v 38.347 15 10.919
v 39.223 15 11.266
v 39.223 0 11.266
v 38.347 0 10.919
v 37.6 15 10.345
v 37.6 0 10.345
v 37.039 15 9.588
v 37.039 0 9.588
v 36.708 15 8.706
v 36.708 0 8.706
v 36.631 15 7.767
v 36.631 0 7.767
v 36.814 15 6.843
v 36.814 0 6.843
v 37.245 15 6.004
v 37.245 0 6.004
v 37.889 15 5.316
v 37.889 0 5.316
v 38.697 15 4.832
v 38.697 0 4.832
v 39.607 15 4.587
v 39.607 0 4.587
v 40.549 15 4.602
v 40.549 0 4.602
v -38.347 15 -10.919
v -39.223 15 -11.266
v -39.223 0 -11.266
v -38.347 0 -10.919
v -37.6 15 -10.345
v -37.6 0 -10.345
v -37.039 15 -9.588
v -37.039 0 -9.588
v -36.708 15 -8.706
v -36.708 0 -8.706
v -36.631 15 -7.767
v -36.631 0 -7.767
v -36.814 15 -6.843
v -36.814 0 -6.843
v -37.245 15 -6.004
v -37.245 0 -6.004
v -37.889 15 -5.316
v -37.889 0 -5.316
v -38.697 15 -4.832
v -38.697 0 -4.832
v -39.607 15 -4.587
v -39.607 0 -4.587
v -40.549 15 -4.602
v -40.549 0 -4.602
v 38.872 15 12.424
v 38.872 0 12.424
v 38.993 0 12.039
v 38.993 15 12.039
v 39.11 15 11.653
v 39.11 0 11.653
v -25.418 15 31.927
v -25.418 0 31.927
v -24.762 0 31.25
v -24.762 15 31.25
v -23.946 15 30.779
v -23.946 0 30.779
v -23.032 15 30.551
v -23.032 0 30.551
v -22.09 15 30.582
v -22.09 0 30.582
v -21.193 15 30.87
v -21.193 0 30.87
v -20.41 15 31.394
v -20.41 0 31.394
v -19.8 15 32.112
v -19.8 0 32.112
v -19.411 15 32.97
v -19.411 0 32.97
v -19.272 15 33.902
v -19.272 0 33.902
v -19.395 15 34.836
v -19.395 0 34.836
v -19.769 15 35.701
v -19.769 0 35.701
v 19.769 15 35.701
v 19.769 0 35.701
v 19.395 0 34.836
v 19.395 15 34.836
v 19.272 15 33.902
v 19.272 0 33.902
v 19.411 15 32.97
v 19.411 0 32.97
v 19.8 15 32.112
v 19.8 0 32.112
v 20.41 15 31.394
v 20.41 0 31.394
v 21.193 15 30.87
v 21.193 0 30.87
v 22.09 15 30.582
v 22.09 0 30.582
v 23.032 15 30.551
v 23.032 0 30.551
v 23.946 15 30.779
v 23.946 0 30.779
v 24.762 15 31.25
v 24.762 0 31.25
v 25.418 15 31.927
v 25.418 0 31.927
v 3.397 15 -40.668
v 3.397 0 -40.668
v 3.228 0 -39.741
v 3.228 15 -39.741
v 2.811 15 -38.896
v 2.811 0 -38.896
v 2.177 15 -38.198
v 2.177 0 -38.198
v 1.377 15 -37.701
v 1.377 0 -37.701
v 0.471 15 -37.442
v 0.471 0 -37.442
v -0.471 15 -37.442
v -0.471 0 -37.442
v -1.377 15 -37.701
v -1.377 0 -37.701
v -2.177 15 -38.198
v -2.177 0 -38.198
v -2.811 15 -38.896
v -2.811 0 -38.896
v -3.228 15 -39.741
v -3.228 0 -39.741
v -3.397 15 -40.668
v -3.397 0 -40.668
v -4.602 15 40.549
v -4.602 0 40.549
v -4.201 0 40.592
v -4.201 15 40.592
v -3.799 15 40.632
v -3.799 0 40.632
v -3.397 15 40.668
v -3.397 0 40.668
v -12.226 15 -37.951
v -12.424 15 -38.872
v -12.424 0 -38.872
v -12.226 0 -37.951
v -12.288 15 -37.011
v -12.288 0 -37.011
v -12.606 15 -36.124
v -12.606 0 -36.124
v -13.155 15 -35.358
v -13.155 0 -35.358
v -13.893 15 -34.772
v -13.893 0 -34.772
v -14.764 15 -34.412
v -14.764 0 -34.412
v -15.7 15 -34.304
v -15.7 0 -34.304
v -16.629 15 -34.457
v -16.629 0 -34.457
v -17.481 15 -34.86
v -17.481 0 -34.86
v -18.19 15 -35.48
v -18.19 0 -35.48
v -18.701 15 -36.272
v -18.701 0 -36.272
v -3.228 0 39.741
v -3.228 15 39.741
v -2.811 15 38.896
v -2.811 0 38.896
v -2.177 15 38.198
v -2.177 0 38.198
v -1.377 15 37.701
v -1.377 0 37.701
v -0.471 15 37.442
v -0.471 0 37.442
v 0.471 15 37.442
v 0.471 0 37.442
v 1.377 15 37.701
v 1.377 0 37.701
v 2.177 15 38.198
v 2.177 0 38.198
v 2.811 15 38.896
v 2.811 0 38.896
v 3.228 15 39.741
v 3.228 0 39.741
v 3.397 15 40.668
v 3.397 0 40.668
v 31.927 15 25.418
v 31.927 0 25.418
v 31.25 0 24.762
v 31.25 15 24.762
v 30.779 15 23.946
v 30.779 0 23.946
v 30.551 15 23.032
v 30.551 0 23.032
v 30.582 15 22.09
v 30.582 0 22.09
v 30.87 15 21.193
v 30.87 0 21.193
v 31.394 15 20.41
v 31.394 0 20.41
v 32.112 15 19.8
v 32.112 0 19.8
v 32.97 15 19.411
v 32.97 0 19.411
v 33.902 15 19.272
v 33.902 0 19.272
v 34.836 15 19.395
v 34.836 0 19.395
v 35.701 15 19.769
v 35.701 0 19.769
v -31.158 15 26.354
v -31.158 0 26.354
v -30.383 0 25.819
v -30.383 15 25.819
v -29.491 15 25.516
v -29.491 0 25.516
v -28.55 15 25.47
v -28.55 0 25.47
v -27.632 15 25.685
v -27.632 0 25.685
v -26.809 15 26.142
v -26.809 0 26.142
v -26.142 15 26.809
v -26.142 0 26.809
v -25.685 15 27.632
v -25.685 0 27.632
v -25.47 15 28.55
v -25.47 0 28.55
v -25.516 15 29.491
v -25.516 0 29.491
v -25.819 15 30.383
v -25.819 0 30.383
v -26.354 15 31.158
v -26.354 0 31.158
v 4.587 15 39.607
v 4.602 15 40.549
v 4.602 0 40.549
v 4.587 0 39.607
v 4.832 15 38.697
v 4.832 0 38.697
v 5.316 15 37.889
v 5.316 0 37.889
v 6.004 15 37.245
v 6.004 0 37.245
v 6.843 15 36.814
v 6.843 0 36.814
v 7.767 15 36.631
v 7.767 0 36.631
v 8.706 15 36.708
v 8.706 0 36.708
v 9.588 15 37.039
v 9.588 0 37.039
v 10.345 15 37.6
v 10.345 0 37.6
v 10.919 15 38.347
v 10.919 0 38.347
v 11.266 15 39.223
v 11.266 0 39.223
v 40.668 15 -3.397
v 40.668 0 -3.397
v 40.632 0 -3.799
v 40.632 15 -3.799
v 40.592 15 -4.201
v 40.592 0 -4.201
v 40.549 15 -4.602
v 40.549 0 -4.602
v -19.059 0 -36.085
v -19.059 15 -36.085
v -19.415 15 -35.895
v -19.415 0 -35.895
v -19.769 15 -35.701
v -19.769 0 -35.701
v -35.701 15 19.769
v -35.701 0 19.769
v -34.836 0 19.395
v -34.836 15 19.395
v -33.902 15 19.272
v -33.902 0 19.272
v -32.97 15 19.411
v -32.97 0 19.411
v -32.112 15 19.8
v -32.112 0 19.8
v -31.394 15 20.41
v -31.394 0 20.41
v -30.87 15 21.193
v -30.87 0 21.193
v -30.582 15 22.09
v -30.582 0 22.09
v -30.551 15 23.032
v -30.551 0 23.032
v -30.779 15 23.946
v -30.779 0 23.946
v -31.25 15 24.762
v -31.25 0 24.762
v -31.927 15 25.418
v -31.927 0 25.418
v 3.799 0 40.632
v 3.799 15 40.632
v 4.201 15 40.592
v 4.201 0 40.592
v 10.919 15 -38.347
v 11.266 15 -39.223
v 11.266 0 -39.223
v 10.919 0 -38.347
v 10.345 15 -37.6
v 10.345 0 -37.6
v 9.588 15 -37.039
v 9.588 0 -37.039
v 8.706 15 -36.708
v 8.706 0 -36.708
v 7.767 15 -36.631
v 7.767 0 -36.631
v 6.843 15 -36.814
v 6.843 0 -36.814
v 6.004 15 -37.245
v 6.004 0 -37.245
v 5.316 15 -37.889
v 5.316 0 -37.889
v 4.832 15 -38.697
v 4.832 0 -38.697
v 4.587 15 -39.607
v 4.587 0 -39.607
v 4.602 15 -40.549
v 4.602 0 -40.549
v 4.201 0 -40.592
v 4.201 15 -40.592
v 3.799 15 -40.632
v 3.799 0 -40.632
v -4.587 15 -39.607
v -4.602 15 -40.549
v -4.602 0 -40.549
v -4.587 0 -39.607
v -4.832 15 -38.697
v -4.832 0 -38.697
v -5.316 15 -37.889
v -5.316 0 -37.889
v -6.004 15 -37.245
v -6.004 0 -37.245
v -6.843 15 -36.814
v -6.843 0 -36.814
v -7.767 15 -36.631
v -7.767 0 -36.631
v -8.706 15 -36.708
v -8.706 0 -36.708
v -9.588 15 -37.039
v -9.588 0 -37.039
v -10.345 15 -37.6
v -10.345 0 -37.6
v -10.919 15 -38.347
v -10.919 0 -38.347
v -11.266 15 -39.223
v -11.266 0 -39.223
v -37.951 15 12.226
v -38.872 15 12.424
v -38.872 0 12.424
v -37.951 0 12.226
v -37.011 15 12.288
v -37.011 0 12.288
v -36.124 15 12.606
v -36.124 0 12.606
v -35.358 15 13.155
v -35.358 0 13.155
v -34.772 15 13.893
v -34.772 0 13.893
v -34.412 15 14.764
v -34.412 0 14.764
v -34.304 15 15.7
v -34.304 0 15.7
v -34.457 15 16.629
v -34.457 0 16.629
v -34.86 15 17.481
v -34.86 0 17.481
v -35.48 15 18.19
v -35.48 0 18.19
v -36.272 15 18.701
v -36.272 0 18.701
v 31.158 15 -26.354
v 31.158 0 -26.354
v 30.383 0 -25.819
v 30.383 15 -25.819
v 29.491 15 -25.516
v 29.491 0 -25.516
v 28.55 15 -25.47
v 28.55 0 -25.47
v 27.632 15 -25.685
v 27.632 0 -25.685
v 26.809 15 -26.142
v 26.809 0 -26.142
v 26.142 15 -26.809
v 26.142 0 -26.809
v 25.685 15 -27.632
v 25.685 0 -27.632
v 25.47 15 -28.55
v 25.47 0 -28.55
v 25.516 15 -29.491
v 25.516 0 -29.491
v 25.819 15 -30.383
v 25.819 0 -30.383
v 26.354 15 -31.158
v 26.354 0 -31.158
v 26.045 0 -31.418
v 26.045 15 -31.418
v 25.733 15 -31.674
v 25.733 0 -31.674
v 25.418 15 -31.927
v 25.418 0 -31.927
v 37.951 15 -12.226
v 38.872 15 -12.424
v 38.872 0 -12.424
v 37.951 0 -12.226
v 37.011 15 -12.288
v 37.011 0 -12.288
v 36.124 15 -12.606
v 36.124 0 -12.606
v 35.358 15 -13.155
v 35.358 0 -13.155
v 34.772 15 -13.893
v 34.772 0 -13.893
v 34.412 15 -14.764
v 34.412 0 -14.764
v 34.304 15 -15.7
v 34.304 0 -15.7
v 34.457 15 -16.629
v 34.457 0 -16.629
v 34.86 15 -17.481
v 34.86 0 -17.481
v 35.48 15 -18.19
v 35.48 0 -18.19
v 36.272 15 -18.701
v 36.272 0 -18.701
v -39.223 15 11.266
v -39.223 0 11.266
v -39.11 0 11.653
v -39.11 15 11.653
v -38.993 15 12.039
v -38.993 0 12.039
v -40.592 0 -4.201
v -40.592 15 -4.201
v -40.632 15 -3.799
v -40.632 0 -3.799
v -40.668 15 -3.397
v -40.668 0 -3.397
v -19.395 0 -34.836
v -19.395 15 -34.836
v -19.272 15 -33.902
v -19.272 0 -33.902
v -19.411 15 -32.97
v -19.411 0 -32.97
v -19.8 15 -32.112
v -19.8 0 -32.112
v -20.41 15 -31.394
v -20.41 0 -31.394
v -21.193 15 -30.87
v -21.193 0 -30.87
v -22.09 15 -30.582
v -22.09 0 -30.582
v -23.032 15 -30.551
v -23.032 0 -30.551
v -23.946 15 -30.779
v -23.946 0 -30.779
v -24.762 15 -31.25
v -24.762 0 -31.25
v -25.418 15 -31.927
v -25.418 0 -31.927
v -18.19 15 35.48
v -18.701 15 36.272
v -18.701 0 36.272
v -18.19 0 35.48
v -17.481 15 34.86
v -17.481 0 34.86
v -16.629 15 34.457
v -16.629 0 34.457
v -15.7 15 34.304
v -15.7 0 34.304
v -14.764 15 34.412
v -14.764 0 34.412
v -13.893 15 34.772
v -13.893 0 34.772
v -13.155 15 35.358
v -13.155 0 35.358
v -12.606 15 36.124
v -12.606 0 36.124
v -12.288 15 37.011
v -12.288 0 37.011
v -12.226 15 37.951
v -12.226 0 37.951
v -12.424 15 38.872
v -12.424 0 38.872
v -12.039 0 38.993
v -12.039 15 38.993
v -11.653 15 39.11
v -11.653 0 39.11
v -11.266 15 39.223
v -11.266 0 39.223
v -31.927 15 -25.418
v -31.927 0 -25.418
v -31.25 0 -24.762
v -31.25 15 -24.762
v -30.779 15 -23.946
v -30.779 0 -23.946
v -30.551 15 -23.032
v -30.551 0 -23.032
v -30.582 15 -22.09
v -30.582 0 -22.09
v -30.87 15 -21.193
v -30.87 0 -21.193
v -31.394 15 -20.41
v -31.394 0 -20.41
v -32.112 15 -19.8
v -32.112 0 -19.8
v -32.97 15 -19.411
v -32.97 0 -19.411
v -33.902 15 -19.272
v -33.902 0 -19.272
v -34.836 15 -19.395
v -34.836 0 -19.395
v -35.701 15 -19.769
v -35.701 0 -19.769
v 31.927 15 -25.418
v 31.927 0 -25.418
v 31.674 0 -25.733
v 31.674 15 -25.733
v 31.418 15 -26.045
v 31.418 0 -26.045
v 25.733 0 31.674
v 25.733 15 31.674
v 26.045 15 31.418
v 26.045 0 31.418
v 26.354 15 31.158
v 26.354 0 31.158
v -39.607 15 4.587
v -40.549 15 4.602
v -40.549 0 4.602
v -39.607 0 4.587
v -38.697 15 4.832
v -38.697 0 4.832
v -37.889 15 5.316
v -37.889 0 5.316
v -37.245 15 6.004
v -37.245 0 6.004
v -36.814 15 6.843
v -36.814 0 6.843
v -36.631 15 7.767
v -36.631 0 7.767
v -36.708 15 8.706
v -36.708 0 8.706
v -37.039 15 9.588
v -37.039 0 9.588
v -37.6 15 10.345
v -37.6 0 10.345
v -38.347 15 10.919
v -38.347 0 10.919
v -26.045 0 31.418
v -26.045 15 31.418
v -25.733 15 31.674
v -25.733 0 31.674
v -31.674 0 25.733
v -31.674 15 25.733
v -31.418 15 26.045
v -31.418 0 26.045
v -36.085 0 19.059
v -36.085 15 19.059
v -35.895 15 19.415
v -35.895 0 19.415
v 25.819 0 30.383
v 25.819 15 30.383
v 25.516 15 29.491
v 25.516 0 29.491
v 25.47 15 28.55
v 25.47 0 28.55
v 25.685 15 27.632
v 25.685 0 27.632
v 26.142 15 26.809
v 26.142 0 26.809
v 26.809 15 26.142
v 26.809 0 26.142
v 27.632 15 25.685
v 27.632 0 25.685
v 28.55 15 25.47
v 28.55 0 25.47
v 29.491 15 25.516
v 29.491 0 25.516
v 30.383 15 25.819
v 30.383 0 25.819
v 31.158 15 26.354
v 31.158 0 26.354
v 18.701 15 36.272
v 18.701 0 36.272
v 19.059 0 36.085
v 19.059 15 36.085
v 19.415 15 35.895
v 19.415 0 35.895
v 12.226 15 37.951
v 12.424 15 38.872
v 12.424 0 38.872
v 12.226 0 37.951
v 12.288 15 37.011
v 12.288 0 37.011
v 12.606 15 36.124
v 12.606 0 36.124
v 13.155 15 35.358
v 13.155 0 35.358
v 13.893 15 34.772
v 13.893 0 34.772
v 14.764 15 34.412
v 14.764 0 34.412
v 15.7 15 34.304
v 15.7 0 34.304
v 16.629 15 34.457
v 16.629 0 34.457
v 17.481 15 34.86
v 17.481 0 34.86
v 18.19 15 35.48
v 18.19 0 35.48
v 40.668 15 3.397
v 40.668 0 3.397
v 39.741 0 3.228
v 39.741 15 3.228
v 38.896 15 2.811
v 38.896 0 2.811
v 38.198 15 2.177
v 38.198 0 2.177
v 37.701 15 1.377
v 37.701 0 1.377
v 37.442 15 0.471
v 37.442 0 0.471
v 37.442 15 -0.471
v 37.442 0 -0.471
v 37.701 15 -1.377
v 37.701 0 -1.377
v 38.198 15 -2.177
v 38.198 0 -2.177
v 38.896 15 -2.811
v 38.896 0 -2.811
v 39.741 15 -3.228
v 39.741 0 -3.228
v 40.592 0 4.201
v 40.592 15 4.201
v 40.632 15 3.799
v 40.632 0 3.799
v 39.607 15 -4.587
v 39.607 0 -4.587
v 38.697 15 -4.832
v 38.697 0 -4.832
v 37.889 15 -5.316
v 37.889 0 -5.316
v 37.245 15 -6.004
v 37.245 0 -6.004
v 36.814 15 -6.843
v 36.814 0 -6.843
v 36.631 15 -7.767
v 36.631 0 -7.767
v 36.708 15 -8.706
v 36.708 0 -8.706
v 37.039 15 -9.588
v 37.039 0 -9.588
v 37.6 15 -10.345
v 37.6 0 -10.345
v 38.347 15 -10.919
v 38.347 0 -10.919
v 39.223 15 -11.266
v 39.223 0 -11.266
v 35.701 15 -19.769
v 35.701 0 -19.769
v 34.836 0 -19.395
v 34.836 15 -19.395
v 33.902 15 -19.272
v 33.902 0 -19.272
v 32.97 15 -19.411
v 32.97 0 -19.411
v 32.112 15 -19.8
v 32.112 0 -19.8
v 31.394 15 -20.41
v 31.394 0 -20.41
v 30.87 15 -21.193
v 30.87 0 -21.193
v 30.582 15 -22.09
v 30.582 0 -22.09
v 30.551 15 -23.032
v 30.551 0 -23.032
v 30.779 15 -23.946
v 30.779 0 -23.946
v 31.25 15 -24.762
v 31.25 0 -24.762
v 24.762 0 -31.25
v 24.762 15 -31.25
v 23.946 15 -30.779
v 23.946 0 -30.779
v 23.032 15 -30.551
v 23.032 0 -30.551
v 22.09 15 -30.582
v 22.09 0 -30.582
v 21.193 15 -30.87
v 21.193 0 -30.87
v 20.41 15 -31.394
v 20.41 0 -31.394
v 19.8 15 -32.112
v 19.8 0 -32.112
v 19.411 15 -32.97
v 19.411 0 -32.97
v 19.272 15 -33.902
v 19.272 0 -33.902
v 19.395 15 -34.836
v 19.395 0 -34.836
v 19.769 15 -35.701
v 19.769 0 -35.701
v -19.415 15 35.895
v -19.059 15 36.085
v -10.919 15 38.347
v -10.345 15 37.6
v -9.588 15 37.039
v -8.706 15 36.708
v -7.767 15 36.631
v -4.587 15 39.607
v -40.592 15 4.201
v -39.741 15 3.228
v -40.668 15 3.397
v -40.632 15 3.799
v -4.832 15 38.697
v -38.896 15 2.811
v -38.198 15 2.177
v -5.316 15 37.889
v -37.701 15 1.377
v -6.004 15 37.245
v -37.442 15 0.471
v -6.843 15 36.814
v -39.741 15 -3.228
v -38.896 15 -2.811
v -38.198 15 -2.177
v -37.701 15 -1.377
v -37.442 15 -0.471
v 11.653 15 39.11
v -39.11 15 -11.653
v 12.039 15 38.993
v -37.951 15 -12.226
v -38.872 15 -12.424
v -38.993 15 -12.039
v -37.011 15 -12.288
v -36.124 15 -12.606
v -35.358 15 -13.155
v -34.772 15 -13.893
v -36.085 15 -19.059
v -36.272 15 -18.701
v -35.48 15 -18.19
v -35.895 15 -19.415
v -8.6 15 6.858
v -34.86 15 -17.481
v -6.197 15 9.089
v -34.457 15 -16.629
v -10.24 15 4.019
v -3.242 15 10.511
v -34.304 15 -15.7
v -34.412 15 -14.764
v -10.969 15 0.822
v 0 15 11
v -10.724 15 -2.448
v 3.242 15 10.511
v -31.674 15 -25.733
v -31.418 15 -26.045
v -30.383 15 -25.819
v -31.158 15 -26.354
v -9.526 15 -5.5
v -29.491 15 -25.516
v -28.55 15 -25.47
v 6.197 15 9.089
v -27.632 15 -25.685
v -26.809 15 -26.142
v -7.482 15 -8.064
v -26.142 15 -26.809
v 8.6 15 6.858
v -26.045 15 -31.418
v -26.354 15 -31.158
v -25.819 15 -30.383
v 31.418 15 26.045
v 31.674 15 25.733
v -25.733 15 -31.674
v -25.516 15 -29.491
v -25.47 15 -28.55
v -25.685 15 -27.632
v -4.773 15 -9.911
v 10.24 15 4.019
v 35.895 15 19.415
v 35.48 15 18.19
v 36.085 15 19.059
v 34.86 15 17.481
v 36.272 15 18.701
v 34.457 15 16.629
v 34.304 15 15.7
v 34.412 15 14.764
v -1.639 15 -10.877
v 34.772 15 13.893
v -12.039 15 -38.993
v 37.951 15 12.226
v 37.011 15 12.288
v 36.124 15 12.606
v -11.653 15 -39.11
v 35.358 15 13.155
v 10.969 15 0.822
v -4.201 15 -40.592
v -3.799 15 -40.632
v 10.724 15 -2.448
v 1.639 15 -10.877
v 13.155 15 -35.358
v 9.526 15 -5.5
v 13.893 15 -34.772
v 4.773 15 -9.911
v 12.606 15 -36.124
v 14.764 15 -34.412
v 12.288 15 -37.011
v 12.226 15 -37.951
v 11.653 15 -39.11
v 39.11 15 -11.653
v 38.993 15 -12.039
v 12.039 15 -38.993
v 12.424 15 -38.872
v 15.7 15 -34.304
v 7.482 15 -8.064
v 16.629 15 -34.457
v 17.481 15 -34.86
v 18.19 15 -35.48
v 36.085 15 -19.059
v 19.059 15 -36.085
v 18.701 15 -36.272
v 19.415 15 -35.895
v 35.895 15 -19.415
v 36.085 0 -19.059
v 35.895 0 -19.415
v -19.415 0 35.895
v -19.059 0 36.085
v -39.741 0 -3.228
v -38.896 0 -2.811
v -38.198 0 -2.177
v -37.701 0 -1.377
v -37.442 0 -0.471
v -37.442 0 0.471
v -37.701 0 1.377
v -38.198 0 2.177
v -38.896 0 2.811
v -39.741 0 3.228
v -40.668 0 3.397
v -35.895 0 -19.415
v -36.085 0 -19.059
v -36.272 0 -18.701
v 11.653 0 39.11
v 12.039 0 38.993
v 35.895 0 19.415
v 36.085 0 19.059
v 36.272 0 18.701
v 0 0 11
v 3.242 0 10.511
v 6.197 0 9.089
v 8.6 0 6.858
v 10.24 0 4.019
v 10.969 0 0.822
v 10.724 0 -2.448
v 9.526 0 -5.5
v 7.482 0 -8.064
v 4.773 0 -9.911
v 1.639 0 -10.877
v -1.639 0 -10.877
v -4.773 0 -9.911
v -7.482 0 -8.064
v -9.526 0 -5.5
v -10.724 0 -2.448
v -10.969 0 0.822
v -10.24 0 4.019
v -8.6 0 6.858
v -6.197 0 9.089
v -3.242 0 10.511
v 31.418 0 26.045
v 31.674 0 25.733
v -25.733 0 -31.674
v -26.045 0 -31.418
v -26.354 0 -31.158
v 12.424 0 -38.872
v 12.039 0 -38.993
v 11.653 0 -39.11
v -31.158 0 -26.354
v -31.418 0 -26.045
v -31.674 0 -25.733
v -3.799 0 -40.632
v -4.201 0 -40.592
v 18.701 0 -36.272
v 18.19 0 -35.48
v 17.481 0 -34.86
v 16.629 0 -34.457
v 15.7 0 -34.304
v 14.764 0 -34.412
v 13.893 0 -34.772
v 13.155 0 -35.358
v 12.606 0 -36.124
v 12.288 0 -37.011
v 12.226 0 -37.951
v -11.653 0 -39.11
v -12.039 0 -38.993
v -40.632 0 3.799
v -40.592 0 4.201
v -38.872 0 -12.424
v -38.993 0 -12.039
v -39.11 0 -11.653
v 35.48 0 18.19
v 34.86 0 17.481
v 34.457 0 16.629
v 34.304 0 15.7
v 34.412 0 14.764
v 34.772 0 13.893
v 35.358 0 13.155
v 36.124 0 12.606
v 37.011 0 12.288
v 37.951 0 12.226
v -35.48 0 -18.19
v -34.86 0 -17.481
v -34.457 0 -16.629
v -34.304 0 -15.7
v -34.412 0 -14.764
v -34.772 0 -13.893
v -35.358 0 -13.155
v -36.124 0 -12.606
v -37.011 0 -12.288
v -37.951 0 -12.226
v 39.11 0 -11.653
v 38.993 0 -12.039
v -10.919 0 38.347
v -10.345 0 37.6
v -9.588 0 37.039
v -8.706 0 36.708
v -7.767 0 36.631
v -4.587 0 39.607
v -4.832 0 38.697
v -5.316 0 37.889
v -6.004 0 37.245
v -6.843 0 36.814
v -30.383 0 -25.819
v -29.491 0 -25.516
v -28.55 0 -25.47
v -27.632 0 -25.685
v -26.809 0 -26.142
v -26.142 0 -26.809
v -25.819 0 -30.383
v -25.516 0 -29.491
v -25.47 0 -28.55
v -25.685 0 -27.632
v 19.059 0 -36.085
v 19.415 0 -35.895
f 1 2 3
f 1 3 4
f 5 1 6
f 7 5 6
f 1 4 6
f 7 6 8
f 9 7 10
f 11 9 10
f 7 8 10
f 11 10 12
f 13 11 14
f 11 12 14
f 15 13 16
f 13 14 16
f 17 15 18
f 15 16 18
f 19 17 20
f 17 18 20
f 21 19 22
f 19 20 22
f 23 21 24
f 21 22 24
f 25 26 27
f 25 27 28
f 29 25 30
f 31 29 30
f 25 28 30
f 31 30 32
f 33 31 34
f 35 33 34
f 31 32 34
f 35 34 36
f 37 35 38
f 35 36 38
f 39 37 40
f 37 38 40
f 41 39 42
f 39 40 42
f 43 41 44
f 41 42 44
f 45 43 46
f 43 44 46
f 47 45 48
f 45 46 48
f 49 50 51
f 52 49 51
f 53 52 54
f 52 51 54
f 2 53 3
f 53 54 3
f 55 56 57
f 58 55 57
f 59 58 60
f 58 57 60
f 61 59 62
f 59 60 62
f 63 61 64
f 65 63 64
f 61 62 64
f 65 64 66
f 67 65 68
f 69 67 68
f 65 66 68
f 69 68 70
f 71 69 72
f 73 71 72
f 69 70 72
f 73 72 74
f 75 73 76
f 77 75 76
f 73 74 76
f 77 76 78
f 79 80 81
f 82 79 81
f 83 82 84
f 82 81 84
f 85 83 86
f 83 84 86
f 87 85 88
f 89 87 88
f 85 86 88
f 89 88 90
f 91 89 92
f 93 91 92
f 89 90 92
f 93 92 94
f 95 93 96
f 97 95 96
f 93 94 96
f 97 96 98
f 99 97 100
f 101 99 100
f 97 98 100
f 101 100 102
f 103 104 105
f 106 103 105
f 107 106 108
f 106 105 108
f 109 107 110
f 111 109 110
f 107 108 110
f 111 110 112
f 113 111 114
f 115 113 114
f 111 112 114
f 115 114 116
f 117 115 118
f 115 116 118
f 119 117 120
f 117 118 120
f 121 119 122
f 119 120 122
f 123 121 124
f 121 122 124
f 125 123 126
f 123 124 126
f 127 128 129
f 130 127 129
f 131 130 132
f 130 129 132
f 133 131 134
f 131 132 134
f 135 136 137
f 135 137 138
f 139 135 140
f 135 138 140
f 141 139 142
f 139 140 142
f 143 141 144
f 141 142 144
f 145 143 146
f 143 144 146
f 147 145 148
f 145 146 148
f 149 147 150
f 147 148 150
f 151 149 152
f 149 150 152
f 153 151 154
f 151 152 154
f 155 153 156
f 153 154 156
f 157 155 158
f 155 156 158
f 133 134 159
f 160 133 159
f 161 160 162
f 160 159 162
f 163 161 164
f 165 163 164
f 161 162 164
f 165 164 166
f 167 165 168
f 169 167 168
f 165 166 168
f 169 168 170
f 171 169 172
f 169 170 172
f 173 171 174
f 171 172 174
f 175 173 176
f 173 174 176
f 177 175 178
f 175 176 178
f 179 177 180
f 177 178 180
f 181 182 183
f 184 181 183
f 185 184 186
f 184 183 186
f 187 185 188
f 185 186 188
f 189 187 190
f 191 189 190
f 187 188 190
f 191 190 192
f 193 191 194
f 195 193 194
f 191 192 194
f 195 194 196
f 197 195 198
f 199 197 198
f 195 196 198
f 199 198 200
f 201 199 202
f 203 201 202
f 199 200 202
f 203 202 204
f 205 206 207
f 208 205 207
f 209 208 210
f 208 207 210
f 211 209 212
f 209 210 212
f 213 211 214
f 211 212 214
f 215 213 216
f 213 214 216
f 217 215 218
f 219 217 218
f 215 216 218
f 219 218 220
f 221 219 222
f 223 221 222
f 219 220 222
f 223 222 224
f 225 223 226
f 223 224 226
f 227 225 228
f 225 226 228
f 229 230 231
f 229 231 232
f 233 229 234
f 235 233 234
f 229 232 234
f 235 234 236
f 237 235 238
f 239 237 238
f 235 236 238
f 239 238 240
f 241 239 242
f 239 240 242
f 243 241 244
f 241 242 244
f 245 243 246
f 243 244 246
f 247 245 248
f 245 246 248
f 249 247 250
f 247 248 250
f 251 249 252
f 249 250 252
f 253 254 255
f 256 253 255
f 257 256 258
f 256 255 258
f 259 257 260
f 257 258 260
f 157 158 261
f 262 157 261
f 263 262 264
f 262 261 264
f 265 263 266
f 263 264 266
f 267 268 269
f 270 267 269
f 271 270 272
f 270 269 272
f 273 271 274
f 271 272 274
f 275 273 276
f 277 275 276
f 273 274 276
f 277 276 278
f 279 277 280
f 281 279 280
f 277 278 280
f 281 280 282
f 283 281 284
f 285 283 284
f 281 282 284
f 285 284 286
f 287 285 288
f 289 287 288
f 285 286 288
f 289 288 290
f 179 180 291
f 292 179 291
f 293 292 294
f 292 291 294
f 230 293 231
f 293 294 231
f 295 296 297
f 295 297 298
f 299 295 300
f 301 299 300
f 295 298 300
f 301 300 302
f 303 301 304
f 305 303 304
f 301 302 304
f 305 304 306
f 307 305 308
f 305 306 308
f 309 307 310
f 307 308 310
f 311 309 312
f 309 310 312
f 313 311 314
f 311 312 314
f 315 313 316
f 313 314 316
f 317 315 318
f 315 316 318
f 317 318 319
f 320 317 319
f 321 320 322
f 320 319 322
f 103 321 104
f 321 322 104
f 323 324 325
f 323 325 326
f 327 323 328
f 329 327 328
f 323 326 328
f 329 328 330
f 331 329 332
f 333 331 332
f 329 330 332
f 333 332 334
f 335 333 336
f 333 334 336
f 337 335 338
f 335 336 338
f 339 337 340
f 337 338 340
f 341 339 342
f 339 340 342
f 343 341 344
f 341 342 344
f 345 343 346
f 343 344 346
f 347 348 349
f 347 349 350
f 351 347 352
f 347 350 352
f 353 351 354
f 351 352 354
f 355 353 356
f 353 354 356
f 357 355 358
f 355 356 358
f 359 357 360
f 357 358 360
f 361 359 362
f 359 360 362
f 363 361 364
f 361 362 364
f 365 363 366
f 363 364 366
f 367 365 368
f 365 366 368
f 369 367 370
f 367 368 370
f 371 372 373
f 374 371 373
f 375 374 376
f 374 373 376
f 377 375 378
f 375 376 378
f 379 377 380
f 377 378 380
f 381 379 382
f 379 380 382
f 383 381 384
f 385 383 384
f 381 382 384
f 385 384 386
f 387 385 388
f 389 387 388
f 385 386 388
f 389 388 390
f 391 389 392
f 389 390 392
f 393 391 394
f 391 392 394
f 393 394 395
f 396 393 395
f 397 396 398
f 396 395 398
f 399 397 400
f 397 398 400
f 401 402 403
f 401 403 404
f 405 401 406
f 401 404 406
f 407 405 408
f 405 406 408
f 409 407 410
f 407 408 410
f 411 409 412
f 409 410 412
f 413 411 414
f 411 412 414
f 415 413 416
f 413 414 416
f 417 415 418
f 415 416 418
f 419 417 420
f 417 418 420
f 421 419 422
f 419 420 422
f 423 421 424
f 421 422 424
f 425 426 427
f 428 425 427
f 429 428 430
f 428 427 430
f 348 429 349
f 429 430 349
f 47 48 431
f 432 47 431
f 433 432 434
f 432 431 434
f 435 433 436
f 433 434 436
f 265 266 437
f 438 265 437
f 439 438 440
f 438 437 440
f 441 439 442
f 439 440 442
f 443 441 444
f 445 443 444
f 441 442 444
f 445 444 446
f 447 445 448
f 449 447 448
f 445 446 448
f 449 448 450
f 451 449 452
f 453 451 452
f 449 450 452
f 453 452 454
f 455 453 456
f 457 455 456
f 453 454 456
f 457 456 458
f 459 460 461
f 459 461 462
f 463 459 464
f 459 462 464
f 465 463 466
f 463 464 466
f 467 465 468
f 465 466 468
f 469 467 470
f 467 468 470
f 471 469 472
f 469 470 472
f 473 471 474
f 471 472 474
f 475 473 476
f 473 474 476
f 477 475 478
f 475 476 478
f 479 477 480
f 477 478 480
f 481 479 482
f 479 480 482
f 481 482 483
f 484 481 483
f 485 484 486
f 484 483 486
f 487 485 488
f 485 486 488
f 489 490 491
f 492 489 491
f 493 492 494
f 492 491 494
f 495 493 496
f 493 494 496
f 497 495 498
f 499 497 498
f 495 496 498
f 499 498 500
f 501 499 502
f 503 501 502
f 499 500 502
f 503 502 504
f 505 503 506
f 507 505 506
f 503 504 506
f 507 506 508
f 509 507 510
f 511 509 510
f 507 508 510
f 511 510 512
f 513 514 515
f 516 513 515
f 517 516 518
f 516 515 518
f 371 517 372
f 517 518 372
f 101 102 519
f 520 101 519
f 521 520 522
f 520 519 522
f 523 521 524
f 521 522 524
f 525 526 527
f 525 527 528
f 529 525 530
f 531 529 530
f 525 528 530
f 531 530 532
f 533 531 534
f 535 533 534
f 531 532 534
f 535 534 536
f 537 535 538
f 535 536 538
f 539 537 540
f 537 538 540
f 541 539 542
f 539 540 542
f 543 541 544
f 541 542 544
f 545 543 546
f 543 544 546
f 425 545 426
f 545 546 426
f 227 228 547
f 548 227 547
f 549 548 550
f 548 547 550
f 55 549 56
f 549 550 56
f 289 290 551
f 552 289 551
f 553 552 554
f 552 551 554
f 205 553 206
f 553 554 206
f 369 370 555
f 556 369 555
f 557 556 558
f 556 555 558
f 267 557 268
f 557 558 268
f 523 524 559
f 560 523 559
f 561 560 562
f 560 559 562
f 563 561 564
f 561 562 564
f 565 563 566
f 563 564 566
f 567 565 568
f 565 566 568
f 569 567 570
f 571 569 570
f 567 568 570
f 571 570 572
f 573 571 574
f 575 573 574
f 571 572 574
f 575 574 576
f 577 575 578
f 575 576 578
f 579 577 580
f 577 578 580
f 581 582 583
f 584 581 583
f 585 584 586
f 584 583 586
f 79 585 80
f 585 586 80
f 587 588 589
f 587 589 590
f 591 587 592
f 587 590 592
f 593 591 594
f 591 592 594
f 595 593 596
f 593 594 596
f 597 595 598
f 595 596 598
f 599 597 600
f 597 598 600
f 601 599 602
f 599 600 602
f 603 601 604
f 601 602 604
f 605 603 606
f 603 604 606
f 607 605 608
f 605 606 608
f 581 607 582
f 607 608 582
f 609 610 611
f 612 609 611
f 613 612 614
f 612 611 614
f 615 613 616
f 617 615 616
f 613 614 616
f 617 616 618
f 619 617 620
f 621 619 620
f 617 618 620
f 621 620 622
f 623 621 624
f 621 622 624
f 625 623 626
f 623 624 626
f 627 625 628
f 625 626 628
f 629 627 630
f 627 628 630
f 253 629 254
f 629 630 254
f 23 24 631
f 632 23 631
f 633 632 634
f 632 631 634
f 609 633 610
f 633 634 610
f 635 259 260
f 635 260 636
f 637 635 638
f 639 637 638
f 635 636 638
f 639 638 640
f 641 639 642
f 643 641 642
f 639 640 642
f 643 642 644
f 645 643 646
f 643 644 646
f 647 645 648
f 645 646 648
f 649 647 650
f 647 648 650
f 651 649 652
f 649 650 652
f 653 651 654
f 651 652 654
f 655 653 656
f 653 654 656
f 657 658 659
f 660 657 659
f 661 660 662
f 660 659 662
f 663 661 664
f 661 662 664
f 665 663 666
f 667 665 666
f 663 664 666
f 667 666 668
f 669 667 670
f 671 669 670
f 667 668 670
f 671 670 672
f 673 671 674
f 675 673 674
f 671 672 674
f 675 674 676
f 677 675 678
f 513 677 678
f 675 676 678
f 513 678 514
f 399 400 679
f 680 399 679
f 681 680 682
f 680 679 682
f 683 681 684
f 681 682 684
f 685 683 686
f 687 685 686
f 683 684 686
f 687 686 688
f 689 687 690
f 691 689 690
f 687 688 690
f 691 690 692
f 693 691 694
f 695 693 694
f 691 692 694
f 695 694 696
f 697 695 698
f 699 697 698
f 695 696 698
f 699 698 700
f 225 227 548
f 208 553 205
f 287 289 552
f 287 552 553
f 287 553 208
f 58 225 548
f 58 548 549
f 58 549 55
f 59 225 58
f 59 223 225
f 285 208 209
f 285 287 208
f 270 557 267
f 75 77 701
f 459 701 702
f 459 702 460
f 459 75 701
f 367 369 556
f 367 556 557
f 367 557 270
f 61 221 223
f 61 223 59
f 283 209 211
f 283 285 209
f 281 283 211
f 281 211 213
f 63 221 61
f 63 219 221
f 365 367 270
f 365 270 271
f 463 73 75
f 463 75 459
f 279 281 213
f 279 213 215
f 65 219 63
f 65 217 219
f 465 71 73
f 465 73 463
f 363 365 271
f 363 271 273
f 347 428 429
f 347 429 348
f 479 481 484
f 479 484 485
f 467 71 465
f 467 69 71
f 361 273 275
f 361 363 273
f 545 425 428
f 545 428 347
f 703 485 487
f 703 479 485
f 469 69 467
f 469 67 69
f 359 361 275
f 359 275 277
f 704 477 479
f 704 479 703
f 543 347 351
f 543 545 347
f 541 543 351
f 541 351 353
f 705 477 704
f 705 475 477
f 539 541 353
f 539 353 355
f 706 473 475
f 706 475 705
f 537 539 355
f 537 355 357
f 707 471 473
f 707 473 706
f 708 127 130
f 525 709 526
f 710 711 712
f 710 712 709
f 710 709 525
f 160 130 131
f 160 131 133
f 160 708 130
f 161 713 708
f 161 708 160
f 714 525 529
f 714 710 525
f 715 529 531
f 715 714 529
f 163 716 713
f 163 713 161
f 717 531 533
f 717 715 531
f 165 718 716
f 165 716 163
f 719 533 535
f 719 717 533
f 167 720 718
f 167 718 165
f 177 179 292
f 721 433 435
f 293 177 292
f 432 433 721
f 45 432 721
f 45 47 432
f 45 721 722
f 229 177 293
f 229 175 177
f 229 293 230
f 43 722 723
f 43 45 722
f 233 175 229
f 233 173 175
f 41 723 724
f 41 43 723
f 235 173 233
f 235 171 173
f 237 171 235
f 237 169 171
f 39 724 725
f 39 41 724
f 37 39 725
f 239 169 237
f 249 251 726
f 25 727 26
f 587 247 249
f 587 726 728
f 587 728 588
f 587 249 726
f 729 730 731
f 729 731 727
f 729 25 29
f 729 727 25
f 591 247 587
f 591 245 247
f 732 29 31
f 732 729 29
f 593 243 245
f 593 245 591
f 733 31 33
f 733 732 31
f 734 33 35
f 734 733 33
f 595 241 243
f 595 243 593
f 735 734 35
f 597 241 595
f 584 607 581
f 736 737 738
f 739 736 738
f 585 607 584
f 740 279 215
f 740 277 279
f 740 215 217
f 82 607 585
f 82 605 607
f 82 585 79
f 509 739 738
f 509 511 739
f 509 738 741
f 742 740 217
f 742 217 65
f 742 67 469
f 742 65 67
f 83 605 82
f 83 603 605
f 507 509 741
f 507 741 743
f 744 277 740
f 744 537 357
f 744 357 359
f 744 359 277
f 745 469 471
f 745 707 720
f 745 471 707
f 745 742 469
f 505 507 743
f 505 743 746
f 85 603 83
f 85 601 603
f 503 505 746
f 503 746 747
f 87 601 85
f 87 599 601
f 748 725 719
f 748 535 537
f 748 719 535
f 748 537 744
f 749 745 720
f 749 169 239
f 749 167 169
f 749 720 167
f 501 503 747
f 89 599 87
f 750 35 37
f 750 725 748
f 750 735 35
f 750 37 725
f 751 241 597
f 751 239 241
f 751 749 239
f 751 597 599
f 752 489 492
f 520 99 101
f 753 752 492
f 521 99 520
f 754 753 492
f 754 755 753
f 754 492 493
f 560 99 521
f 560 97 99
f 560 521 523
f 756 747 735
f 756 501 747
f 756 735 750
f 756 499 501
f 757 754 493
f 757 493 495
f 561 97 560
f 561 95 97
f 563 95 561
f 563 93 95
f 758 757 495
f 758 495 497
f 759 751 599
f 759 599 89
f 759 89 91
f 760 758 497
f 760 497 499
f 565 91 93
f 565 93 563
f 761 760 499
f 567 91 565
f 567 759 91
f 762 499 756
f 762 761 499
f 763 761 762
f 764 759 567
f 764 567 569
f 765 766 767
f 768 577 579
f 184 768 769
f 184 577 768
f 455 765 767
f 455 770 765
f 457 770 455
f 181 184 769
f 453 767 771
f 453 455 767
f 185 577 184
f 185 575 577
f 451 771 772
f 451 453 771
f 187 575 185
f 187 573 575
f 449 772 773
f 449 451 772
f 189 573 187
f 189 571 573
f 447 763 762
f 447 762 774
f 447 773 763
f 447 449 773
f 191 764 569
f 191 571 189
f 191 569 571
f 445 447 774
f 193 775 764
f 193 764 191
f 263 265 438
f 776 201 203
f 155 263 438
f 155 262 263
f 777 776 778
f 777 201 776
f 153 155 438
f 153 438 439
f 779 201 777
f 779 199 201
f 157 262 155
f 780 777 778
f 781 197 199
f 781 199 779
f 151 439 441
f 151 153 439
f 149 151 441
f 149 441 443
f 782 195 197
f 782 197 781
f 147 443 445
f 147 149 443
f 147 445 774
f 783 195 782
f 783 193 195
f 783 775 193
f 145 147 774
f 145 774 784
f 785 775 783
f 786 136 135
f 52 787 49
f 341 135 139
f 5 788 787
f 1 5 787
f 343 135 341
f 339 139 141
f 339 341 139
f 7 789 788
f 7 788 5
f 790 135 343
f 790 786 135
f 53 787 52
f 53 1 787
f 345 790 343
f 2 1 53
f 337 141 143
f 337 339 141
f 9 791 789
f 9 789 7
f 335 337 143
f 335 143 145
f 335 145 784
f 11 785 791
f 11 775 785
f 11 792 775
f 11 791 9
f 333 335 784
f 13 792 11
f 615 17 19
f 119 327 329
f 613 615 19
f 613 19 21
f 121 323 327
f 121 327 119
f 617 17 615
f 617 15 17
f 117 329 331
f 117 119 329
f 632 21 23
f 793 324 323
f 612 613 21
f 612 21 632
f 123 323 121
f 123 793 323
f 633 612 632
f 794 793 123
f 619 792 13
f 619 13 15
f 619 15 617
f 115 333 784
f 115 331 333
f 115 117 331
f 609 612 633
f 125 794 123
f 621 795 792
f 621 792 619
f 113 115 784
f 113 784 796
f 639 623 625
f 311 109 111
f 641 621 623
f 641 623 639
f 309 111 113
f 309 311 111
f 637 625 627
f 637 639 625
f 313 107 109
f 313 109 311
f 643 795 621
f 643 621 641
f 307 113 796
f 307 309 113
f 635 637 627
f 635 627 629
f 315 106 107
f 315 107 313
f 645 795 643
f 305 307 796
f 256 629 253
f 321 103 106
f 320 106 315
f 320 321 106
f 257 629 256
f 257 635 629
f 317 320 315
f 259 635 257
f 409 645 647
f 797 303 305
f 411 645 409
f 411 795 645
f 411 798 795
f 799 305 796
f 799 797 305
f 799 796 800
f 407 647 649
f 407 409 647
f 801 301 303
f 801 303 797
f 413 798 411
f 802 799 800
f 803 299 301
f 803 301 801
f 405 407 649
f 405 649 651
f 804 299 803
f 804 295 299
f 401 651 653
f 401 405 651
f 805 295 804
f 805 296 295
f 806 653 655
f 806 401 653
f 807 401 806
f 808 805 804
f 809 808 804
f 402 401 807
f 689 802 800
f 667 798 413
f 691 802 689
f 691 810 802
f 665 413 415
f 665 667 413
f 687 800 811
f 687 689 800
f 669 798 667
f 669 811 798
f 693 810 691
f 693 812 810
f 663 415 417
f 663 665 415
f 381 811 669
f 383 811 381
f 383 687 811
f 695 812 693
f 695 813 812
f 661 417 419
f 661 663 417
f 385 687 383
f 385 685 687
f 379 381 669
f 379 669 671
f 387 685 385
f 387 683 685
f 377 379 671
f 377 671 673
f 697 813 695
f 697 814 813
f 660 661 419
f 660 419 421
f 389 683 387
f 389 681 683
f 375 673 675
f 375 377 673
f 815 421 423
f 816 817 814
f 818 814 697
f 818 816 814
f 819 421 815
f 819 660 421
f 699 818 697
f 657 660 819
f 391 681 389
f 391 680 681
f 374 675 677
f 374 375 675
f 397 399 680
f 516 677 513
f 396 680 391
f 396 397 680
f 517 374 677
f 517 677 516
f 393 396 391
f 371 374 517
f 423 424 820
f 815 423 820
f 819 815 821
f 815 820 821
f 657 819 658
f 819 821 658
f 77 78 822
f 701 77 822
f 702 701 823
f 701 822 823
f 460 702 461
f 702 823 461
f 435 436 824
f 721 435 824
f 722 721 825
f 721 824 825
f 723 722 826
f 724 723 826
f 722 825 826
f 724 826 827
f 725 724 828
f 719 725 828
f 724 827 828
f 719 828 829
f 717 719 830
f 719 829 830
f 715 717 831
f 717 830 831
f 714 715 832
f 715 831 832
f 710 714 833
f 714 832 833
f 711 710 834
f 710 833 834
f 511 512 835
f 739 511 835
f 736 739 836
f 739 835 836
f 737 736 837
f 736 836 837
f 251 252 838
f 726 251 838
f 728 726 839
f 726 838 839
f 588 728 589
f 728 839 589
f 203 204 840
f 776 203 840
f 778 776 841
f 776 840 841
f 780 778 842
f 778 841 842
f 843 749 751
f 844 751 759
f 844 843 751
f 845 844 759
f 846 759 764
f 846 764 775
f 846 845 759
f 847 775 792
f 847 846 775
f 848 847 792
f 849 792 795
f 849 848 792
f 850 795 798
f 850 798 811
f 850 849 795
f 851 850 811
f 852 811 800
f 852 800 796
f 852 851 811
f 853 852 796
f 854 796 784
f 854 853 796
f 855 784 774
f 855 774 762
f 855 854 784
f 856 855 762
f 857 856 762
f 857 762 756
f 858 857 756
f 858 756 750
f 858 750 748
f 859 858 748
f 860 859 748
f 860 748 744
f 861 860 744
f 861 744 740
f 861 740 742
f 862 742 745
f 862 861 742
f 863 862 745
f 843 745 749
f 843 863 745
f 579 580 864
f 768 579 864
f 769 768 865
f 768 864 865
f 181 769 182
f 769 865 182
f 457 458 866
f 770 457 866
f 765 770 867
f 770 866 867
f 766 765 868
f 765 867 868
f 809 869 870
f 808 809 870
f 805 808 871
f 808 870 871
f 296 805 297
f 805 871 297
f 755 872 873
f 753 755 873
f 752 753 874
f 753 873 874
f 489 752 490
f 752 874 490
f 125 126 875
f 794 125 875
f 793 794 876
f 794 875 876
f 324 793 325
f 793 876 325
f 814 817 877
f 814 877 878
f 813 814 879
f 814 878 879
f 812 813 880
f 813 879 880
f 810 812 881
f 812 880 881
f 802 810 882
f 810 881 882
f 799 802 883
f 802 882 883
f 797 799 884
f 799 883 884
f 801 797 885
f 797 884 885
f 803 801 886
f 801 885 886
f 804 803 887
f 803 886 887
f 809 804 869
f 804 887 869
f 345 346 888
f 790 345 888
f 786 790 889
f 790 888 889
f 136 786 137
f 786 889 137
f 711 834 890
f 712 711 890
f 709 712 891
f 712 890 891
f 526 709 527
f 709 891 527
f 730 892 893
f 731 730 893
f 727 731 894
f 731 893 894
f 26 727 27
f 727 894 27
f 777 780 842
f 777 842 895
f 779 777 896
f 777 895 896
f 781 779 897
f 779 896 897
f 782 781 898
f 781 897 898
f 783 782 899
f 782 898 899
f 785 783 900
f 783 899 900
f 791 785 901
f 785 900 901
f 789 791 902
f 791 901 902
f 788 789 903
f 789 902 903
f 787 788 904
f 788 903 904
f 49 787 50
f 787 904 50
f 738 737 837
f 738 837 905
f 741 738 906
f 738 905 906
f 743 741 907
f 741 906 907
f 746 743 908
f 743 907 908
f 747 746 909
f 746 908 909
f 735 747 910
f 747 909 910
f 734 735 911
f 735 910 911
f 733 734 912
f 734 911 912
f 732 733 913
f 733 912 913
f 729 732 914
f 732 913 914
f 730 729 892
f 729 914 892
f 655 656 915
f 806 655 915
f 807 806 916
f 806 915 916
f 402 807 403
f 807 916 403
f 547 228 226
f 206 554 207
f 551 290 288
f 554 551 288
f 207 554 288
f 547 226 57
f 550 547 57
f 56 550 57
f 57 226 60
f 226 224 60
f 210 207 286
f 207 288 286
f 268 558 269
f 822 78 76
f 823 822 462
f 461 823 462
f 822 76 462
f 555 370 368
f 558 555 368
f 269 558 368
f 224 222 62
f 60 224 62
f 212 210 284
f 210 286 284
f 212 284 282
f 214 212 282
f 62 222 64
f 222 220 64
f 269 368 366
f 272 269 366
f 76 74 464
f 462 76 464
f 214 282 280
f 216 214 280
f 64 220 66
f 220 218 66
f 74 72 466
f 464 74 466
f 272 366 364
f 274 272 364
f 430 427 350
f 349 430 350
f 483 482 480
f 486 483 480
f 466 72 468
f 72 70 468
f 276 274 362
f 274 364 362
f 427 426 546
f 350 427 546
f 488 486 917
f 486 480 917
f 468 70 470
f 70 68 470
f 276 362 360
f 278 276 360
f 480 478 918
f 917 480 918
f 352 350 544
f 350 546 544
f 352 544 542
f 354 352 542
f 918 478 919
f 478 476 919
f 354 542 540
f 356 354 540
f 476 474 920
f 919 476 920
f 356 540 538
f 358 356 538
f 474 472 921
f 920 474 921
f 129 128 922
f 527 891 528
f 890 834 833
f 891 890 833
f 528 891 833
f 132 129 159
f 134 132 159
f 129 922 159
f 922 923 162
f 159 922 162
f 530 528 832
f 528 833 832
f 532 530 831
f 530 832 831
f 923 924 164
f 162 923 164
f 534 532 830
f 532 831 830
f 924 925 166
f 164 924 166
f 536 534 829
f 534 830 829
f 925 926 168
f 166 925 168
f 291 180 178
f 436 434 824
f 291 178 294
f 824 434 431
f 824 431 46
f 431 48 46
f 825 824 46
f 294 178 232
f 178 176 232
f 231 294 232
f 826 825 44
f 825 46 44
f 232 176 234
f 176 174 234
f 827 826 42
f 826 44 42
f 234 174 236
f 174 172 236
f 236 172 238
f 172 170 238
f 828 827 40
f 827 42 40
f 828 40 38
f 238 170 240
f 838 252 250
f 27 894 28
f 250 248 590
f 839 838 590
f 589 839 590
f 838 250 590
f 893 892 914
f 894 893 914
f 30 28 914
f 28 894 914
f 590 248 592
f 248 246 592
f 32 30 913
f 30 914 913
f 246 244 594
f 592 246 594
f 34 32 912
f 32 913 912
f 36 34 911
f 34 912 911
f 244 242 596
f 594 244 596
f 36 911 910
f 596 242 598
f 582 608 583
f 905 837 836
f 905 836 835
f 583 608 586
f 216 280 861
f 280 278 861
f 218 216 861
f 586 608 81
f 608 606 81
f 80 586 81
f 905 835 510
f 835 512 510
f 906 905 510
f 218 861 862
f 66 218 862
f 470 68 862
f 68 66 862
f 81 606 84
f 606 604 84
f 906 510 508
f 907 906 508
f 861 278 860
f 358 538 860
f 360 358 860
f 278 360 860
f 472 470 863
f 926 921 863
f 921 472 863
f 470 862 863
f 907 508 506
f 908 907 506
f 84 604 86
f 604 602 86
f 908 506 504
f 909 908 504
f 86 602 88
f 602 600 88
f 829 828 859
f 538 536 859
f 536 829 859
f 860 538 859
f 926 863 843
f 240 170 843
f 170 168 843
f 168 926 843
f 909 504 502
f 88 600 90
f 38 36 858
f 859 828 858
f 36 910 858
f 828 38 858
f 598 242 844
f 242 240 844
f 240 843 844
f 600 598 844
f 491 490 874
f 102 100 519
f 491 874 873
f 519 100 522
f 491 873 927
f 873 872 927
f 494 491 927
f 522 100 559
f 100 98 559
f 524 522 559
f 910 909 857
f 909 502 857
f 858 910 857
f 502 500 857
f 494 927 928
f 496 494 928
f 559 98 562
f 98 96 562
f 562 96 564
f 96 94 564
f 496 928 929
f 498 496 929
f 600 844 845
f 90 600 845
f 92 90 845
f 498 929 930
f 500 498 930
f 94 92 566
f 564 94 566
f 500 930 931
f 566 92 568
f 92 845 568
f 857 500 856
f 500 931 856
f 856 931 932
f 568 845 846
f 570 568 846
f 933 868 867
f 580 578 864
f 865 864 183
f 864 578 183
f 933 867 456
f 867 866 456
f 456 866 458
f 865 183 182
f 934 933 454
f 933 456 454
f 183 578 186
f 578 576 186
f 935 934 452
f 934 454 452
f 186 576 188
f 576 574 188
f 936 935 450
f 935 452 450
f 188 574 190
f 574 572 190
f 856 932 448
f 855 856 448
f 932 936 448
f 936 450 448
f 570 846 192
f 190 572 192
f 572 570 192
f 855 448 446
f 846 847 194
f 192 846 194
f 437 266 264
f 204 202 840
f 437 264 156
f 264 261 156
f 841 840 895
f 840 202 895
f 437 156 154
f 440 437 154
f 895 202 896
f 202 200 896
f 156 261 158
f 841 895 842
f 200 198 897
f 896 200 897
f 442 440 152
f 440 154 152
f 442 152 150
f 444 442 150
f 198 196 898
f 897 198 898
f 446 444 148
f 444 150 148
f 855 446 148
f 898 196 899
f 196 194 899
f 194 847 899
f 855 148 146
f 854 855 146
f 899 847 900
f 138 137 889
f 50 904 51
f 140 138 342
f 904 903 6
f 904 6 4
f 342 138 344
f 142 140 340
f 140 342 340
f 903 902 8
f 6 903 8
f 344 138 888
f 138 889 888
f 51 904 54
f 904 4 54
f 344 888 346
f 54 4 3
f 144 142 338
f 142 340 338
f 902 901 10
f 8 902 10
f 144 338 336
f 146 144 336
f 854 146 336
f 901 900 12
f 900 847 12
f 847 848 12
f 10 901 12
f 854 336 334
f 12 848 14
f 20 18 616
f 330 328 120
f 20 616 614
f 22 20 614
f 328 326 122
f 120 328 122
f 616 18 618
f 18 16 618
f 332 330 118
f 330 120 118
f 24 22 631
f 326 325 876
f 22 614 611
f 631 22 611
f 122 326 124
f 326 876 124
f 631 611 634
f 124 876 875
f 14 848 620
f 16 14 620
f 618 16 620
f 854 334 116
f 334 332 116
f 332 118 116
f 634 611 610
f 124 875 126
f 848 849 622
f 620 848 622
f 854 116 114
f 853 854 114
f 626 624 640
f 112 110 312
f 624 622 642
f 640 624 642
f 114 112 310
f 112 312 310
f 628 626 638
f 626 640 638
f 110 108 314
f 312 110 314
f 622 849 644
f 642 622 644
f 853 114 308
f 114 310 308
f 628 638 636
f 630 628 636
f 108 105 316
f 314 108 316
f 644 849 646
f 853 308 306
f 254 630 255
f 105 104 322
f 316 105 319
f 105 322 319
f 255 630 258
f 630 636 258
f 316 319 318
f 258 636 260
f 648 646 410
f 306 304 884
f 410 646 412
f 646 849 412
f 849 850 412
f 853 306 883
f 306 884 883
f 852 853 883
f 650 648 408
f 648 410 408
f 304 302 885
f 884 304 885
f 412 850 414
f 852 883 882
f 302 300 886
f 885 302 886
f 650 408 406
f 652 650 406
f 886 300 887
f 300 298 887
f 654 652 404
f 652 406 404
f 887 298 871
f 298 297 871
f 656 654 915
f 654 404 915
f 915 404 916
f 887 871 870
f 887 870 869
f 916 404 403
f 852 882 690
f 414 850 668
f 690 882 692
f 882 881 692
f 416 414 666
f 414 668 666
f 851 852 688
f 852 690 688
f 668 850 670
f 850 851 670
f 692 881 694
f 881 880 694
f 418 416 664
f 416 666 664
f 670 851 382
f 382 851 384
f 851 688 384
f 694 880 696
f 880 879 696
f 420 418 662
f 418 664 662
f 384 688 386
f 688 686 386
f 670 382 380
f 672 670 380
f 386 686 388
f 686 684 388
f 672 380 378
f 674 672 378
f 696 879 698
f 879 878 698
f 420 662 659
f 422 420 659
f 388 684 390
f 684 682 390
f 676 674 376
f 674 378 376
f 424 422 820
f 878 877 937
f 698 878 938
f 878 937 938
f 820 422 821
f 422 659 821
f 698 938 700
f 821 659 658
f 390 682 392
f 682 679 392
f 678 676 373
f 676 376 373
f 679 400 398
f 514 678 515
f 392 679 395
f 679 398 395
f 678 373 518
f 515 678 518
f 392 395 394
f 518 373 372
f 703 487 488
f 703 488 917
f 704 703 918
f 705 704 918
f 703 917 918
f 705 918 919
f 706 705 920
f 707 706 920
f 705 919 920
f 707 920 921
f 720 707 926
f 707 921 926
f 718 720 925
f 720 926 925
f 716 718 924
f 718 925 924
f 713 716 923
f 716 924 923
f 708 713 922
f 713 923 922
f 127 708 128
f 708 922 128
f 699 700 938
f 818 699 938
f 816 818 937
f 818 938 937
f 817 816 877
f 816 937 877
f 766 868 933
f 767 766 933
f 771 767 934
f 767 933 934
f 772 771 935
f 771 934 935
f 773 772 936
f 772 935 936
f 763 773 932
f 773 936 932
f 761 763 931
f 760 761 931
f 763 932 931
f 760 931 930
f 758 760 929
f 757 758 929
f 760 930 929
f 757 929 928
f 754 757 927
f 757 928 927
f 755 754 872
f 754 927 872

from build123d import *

# Parameters (mm, degrees)
SKETCH1_R           = 11
BOSS_EXTRUDE1_DEPTH = 15


with BuildPart() as part:
    # Sketch1 → Boss-Extrude1 (new body)
    with BuildSketch(Plane(origin=(0, 0, 0), x_dir=(1, 0, 0), z_dir=(0, 1, 0))):
        with BuildLine():
            ThreePointArc((40.667554182, -3.397048659), (37.40918895, 0), (40.667554182, 3.397048659))
            ThreePointArc((40.667554182, 3.397048659), (40.61268155, 4), (40.548869848, 4.602070919))
            ThreePointArc((40.548869848, 4.602070919), (36.690381874, 7.298170719), (39.223407215, 11.265621563))
            ThreePointArc((39.223407215, 11.265621563), (39.051958974, 11.846282243), (38.871915187, 12.424335493))
            ThreePointArc((38.871915187, 12.424335493), (34.561583998, 14.315876829), (36.271926705, 18.701262947))
            ThreePointArc((36.271926705, 18.701262947), (35.990491515, 19.237318503), (35.701134624, 19.769139821))
            ThreePointArc((35.701134624, 19.769139821), (31.104603832, 20.783431822), (31.926536394, 25.418225285))
            ThreePointArc((31.926536394, 25.418225285), (31.545929651, 25.889075402), (31.158379479, 26.354227193))
            ThreePointArc((31.158379479, 26.354227193), (26.452291185, 26.452291185), (26.354227193, 31.158379479))
            ThreePointArc((26.354227193, 31.158379479), (25.889075402, 31.545929651), (25.418225285, 31.926536394))
            ThreePointArc((25.418225285, 31.926536394), (20.783431822, 31.104603832), (19.769139821, 35.701134624))
            ThreePointArc((19.769139821, 35.701134624), (19.237318503, 35.990491515), (18.701262947, 36.271926705))
            ThreePointArc((18.701262947, 36.271926705), (14.315876829, 34.561583998), (12.424335493, 38.871915187))
            ThreePointArc((12.424335493, 38.871915187), (11.846282243, 39.051958974), (11.265621563, 39.223407215))
            ThreePointArc((11.265621563, 39.223407215), (7.298170719, 36.690381874), (4.602070919, 40.548869848))
            ThreePointArc((4.602070919, 40.548869848), (4, 40.61268155), (3.397048659, 40.667554182))
            ThreePointArc((3.397048659, 40.667554182), (0, 37.40918895), (-3.397048659, 40.667554182))
            ThreePointArc((-3.397048659, 40.667554182), (-4, 40.61268155), (-4.602070919, 40.548869848))
            ThreePointArc((-4.602070919, 40.548869848), (-7.298170719, 36.690381874), (-11.265621563, 39.223407215))
            ThreePointArc((-11.265621563, 39.223407215), (-11.846282243, 39.051958974), (-12.424335493, 38.871915187))
            ThreePointArc((-12.424335493, 38.871915187), (-14.315876829, 34.561583998), (-18.701262947, 36.271926705))
            ThreePointArc((-18.701262947, 36.271926705), (-19.237318503, 35.990491515), (-19.769139821, 35.701134624))
            ThreePointArc((-19.769139821, 35.701134624), (-20.783431822, 31.104603832), (-25.418225285, 31.926536394))
            ThreePointArc((-25.418225285, 31.926536394), (-25.889075402, 31.545929651), (-26.354227193, 31.158379479))
            ThreePointArc((-26.354227193, 31.158379479), (-26.452291185, 26.452291185), (-31.158379479, 26.354227193))
            ThreePointArc((-31.158379479, 26.354227193), (-31.545929651, 25.889075402), (-31.926536394, 25.418225285))
            ThreePointArc((-31.926536394, 25.418225285), (-31.104603832, 20.783431822), (-35.701134624, 19.769139821))
            ThreePointArc((-35.701134624, 19.769139821), (-35.990491515, 19.237318503), (-36.271926705, 18.701262947))
            ThreePointArc((-36.271926705, 18.701262947), (-34.561583998, 14.315876829), (-38.871915187, 12.424335493))
            ThreePointArc((-38.871915187, 12.424335493), (-39.051958974, 11.846282243), (-39.223407215, 11.265621563))
            ThreePointArc((-39.223407215, 11.265621563), (-36.690381874, 7.298170719), (-40.548869848, 4.602070919))
            ThreePointArc((-40.548869848, 4.602070919), (-40.61268155, 4), (-40.667554182, 3.397048659))
            ThreePointArc((-40.667554182, 3.397048659), (-37.40918895, 0), (-40.667554182, -3.397048659))
            ThreePointArc((-40.667554182, -3.397048659), (-40.61268155, -4), (-40.548869848, -4.602070919))
            ThreePointArc((-40.548869848, -4.602070919), (-36.690381874, -7.298170719), (-39.223407215, -11.265621563))
            ThreePointArc((-39.223407215, -11.265621563), (-39.051958974, -11.846282243), (-38.871915187, -12.424335493))
            ThreePointArc((-38.871915187, -12.424335493), (-34.561583998, -14.315876829), (-36.271926705, -18.701262947))
            ThreePointArc((-36.271926705, -18.701262947), (-35.990491515, -19.237318503), (-35.701134624, -19.769139821))
            ThreePointArc((-35.701134624, -19.769139821), (-31.104603832, -20.783431822), (-31.926536394, -25.418225285))
            ThreePointArc((-31.926536394, -25.418225285), (-31.545929651, -25.889075402), (-31.158379479, -26.354227193))
            ThreePointArc((-31.158379479, -26.354227193), (-26.452291185, -26.452291185), (-26.354227193, -31.158379479))
            ThreePointArc((-26.354227193, -31.158379479), (-25.889075402, -31.545929651), (-25.418225285, -31.926536394))
            ThreePointArc((-25.418225285, -31.926536394), (-20.783431822, -31.104603832), (-19.769139821, -35.701134624))
            ThreePointArc((-19.769139821, -35.701134624), (-19.237318503, -35.990491515), (-18.701262947, -36.271926705))
            ThreePointArc((-18.701262947, -36.271926705), (-14.315876829, -34.561583998), (-12.424335493, -38.871915187))
            ThreePointArc((-12.424335493, -38.871915187), (-11.846282243, -39.051958974), (-11.265621563, -39.223407215))
            ThreePointArc((-11.265621563, -39.223407215), (-7.298170719, -36.690381874), (-4.602070919, -40.548869848))
            ThreePointArc((-4.602070919, -40.548869848), (-4, -40.61268155), (-3.397048659, -40.667554182))
            ThreePointArc((-3.397048659, -40.667554182), (0, -37.40918895), (3.397048659, -40.667554182))
            ThreePointArc((3.397048659, -40.667554182), (4, -40.61268155), (4.602070919, -40.548869848))
            ThreePointArc((4.602070919, -40.548869848), (7.298170719, -36.690381874), (11.265621563, -39.223407215))
            ThreePointArc((11.265621563, -39.223407215), (11.846282243, -39.051958974), (12.424335493, -38.871915187))
            ThreePointArc((12.424335493, -38.871915187), (14.315876829, -34.561583998), (18.701262947, -36.271926705))
            ThreePointArc((18.701262947, -36.271926705), (19.237318503, -35.990491515), (19.769139821, -35.701134624))
            ThreePointArc((19.769139821, -35.701134624), (20.783431822, -31.104603832), (25.418225285, -31.926536394))
            ThreePointArc((25.418225285, -31.926536394), (25.889075402, -31.545929651), (26.354227193, -31.158379479))
            ThreePointArc((26.354227193, -31.158379479), (26.452291185, -26.452291185), (31.158379479, -26.354227193))
            ThreePointArc((31.158379479, -26.354227193), (31.545929651, -25.889075402), (31.926536394, -25.418225285))
            ThreePointArc((31.926536394, -25.418225285), (31.104603832, -20.783431822), (35.701134624, -19.769139821))
            ThreePointArc((35.701134624, -19.769139821), (35.990491515, -19.237318503), (36.271926705, -18.701262947))
            ThreePointArc((36.271926705, -18.701262947), (34.561583998, -14.315876829), (38.871915187, -12.424335493))
            ThreePointArc((38.871915187, -12.424335493), (39.051958974, -11.846282243), (39.223407215, -11.265621563))
            ThreePointArc((39.223407215, -11.265621563), (36.690381874, -7.298170719), (40.548869848, -4.602070919))
            ThreePointArc((40.548869848, -4.602070919), (40.61268155, -4), (40.667554182, -3.397048659))
        make_face()
        with Locations(Location((0, 0, 0), (0, 0, 270))):
            Circle(SKETCH1_R, mode=Mode.SUBTRACT)
    extrude(amount=BOSS_EXTRUDE1_DEPTH)


solid = part.part
